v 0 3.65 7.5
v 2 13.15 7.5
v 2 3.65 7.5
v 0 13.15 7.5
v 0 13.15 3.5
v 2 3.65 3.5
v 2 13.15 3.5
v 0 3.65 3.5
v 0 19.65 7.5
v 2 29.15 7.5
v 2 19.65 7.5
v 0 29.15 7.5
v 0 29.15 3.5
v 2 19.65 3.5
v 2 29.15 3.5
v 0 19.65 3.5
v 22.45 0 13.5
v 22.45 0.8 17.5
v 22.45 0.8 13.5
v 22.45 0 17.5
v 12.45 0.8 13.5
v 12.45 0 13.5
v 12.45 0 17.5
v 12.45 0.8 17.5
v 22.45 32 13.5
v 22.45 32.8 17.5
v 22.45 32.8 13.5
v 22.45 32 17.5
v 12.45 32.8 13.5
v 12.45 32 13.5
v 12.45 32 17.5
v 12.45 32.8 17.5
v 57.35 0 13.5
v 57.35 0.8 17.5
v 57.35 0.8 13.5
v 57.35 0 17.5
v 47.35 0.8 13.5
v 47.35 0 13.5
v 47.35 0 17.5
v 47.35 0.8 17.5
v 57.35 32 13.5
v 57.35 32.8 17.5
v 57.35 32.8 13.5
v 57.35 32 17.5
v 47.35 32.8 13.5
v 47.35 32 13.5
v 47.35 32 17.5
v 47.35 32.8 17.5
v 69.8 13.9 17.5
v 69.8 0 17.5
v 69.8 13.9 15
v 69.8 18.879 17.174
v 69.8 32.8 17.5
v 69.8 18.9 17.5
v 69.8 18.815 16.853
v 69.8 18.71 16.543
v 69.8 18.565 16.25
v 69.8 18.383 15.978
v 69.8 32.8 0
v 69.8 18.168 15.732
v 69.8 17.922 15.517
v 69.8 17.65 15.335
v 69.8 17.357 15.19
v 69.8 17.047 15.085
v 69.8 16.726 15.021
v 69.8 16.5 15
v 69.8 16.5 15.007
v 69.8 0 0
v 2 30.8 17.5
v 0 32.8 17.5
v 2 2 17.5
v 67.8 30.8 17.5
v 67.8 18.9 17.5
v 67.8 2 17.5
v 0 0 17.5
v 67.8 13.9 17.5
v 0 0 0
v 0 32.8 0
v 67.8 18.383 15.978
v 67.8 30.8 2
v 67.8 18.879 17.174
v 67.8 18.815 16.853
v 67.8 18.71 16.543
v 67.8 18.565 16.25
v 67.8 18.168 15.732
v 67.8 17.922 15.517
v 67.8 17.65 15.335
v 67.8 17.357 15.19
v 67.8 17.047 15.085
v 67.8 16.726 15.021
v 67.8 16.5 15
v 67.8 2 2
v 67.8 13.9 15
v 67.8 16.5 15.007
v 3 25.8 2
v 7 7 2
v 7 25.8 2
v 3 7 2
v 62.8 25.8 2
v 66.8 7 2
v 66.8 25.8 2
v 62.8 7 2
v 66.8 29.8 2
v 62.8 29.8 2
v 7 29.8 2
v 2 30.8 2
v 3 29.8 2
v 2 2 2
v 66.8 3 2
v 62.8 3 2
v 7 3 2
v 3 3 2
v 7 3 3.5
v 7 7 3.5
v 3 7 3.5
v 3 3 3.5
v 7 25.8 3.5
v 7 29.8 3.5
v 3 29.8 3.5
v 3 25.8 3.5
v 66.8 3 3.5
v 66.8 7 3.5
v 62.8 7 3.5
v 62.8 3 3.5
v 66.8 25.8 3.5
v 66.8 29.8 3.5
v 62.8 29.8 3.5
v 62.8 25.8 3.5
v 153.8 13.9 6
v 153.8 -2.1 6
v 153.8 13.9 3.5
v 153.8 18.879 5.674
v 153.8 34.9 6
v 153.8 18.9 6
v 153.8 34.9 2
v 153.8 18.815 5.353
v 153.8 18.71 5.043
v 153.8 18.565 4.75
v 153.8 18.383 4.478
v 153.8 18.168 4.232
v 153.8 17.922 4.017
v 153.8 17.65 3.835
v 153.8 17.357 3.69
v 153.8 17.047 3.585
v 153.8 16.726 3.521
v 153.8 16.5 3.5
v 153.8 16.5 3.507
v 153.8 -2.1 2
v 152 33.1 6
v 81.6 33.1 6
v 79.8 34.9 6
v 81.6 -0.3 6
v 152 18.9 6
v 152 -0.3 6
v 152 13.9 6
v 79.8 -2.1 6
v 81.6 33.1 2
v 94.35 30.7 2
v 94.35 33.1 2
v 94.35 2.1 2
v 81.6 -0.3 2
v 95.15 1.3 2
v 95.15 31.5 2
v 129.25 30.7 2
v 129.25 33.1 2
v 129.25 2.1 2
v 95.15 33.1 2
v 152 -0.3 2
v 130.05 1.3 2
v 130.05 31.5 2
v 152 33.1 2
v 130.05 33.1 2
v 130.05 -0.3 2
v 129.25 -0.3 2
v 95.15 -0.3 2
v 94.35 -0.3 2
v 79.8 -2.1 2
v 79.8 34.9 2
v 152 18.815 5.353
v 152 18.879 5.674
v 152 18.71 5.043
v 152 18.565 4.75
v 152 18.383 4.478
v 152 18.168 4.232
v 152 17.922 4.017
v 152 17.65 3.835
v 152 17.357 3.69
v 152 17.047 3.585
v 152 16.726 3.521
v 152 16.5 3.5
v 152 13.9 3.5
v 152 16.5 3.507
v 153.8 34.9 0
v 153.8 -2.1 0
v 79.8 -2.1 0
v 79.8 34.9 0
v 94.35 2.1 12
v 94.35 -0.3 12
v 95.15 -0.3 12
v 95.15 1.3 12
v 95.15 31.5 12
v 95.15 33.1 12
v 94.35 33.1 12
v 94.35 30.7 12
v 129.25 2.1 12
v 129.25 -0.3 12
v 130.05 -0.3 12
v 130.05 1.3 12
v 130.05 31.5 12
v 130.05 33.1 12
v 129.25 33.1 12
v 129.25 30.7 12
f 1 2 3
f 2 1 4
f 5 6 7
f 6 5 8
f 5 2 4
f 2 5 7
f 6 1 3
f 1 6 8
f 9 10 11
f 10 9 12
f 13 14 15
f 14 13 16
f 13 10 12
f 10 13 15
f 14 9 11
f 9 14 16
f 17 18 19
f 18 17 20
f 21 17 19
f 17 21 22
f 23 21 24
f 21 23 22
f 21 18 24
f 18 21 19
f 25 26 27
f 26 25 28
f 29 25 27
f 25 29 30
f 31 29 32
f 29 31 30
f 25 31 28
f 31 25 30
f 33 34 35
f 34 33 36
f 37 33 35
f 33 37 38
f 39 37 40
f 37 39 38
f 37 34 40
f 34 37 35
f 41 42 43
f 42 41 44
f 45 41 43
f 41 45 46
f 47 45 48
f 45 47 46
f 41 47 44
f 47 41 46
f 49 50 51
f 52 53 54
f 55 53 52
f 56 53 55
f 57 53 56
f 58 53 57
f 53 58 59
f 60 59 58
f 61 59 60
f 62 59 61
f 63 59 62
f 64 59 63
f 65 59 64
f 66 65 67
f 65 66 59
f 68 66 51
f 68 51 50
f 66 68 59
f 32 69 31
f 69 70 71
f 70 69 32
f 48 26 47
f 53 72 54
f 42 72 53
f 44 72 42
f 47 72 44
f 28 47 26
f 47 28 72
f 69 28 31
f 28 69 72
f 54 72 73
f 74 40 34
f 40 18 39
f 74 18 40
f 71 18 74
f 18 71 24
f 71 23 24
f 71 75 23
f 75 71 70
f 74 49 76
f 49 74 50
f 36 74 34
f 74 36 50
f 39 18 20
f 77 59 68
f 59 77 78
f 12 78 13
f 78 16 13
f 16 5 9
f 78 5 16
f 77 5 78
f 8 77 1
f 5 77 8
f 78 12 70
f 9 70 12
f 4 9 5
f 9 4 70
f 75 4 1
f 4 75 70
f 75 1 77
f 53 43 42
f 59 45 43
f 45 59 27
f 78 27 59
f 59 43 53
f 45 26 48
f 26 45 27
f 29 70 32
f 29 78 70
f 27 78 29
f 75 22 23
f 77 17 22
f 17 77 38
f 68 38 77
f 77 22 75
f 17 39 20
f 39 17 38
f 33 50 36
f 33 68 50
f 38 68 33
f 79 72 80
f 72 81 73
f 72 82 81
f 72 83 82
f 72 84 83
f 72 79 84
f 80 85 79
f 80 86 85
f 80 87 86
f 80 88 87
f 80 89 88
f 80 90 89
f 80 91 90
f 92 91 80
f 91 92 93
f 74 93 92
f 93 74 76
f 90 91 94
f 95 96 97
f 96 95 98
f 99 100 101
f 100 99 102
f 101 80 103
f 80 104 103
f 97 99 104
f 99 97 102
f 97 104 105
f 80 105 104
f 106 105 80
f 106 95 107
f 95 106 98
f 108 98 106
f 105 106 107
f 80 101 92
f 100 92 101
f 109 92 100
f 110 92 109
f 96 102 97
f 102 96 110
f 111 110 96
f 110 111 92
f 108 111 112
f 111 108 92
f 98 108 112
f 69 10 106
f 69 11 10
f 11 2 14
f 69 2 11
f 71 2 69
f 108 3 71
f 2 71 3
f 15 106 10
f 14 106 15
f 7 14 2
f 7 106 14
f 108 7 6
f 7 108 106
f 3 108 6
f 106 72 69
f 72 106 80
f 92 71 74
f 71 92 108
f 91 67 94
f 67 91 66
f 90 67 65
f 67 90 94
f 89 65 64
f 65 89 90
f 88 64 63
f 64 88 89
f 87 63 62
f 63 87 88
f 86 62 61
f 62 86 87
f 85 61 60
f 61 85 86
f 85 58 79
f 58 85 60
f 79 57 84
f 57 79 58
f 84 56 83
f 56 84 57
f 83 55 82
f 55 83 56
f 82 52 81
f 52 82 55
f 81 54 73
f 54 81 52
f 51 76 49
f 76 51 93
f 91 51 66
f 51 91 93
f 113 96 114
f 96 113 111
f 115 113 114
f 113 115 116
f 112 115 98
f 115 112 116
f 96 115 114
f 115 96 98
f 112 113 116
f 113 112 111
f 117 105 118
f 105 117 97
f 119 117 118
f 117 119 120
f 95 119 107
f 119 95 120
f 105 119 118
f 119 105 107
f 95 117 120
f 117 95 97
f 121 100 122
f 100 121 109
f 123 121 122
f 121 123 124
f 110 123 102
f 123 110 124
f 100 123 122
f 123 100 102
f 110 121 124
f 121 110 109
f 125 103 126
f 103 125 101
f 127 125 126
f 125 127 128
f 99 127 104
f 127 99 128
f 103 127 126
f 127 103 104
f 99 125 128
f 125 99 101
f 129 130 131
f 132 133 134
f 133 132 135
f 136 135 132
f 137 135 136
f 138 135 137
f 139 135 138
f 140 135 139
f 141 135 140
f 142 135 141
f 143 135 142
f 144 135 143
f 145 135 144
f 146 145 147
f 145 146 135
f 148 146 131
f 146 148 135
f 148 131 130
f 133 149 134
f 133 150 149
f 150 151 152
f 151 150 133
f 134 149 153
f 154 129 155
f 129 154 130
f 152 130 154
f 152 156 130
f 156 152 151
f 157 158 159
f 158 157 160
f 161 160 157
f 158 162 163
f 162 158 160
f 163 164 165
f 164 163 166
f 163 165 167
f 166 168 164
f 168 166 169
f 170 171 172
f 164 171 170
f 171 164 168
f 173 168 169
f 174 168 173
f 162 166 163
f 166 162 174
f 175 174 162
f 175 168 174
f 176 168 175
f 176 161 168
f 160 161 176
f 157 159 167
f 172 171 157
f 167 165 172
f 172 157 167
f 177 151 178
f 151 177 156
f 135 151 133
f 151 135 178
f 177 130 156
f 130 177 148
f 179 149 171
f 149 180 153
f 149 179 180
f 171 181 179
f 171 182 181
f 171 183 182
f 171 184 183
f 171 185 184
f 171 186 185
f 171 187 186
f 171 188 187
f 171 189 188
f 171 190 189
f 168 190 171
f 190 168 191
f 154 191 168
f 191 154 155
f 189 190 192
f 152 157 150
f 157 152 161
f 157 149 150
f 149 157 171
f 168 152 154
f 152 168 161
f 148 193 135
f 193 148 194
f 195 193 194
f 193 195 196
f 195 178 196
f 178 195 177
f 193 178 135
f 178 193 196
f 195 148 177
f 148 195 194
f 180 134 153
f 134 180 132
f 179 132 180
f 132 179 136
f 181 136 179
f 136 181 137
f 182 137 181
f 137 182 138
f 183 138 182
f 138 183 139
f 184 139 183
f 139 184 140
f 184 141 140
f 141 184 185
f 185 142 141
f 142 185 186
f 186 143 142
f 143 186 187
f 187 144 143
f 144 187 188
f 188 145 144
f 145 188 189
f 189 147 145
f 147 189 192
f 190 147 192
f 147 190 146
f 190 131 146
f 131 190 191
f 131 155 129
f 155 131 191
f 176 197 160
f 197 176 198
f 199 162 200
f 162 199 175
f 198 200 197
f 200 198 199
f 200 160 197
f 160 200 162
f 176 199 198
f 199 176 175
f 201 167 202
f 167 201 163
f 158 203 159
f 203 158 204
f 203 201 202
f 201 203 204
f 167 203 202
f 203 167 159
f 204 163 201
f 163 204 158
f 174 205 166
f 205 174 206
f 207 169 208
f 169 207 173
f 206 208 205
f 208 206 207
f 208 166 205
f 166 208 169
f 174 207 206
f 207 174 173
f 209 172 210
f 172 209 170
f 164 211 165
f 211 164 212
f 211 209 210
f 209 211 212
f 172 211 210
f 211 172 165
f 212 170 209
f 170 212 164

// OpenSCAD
// ─────────────────────────────────────────────────────────────────────────────
// CWPokeKey — Caja para ESP32-S3 DevKitC-1
// OpenSCAD paramétrico · tapa a presión (4 clips en los lados largos)
//
// EJES
//   X : eje largo de la placa  (X=0 → pared USB-C  /  X=OL → pared jack TRS)
//   Y : eje ancho (headers)
//   Z : altura
//
// CÓMO USAR
//   F5 = vista previa   F6 = render final   Archivo › Exportar › Export as STL
//
//   Cuerpo : deja  render_box();  y comenta  render_lid();
//   Tapa   : deja  render_lid();  y comenta  render_box();
//
// ORIENTACIÓN DE IMPRESIÓN
//   Cuerpo : suelo hacia abajo — sin soportes
//   Tapa   : cara exterior hacia abajo (girar 180° en el slicer) — sin soportes
//
// AJUSTE
//   TOL     : aumenta si la placa entra muy justa
//   LIP_GAP : aumenta si la tapa no desliza
//   SNAP_D  : reduce si los clips van muy duros
// ─────────────────────────────────────────────────────────────────────────────

$fn = 48;

// ── PLACA ────────────────────────────────────────────────────────────────────

BL = 65;   // largo con headers  (eje X: pared USB-C ↔ pared jack)
BW = 28;   // ancho con headers  (eje Y)
BH = 14;   // alto total (PCB + componentes + pines)

// ── GEOMETRÍA DE CAJA ────────────────────────────────────────────────────────

TOL   = 0.4;  // holgura por lado
WL    = 2.0;  // grosor de pared
FLOOR = 1.5;  // espacio libre bajo la placa

// Dimensiones interiores
IL = BL + 2*TOL;
IW = BW + 2*TOL;
IH = BH + FLOOR;

// Dimensiones exteriores del cuerpo
OL = IL + 2*WL;
OW = IW + 2*WL;
OH = IH + WL;   // WL = suelo sólido

// ── APERTURAS USB-C (pared X=0, extremo corto) ───────────────────────────────
// Dos conectores USB-C centrados en el ancho de la placa

USB_W  = 9.5;   // ancho de cada apertura
USB_H  = 4.0;   // alto de cada apertura
USB_CC = 16.0;  // distancia centro a centro entre los dos conectores
USB_Z  =  2.0;  // altura del centro del conector sobre el fondo de la placa

// ── RANURA JACK TRS (pared X=OL, forma U abierta arriba) ─────────────────────

JACK_R = 2.5;   // radio ranura: cable 4 mm + 0.5 mm holgura

// ── CLIPS DE CIERRE ──────────────────────────────────────────────────────────
// 2 clips en la pared Y=0, 2 en la pared Y=OW (lados largos)

CLIP_W  = 10;   // ancho del clip
LIP_D   =  4;   // profundidad del labio de la tapa
LIP_GAP = 0.3;  // holgura labio ↔ exterior de caja
SNAP_D  = 0.8;  // profundidad del resalte de enganche

// ── TAPA ─────────────────────────────────────────────────────────────────────

LID_T   = 2.0;  // grosor panel de tapa
LIP_WL  = 1.8;  // grosor del labio de la tapa

// ── CALCULADOS ────────────────────────────────────────────────────────────────

// Centro absoluto (Z) del conector USB desde el exterior del suelo
usb_z_abs = WL + FLOOR + USB_Z;

// X de los dos clips por cara larga (en OL*0.25 y OL*0.75)
clip_x = [OL*0.25, OL*0.75];

// ─────────────────────────────────────────────────────────────────────────────
// MÓDULOS
// ─────────────────────────────────────────────────────────────────────────────

// Ranura en U: semicírculo en la base + slot rectangular hasta el borde superior
// Se usa para el hueco del jack en el cuerpo y en la tapa.
// Orientación: la apertura queda en +Z (hacia arriba).
// La geometría se extrude en el eje Y (rotation -90° para cortar pared en X).
module u_slot_xz(r, thick) {
    // Llamada: translate al centro, rotate para orientar, luego extruye en Y
    linear_extrude(thick + 0.2)
        union() {
            circle(r = r);
            translate([-r, -r]) square([r*2, r + 0.1]);
        }
}

// ─────────────────────────────────────────────────────────────────────────────
// CUERPO
// ─────────────────────────────────────────────────────────────────────────────

module box_body() {
    difference() {
        // Bloque exterior sólido
        cube([OL, OW, OH]);

        // Vaciado interior (abierto por arriba, +1 para limpiar cara superior)
        translate([WL, WL, WL])
            cube([IL, IW, IH + 1]);

        // ── Aperturas USB-C (pared X=0) ──────────────────────────────────
        for (yc = [OW/2 - USB_CC/2, OW/2 + USB_CC/2])
            translate([-0.1, yc - USB_W/2, usb_z_abs - USB_H/2])
                cube([WL + 0.2, USB_W, USB_H]);

        // ── Ranura U jack TRS (pared X=OL) ───────────────────────────────
        // El semicírculo queda centrado en Y=OW/2, Z=OH (borde superior)
        translate([OL - WL - 0.1, OW/2, OH])
            rotate([0, 90, 0])                // extruye en +X (atraviesa la pared)
                u_slot_xz(JACK_R, WL);

        // ── Muescas para clips (pared Y=0 y Y=OW) ────────────────────────
        for (cx = clip_x) {
            // Pared Y=0
            translate([cx - CLIP_W/2, -0.1, OH - LIP_D])
                cube([CLIP_W, SNAP_D + 0.1, LIP_D + 0.1]);
            // Pared Y=OW
            translate([cx - CLIP_W/2, OW - SNAP_D, OH - LIP_D])
                cube([CLIP_W, SNAP_D + 0.1, LIP_D + 0.1]);
        }
    }

    // Topes de esquina: elevan la placa FLOOR mm del suelo
    for (x = [WL + 1, OL - WL - 5])
        for (y = [WL + 1, OW - WL - 5])
            translate([x, y, WL])
                cube([4, 4, FLOOR]);
}

// ─────────────────────────────────────────────────────────────────────────────
// TAPA
// ─────────────────────────────────────────────────────────────────────────────

// El labio envuelve el exterior del cuerpo con holgura LIP_GAP.
// Modelada "al derecho" (cara exterior arriba); para imprimirla,
// girar 180° en el slicer para que la cara exterior quede sobre la cama.

module lid() {
    // Dimensiones exteriores del labio
    ll = OL + 2*(LIP_GAP + LIP_WL);
    lw = OW + 2*(LIP_GAP + LIP_WL);
    // Offset del labio respecto al origen del cuerpo
    lx = -(LIP_GAP + LIP_WL);
    ly = -(LIP_GAP + LIP_WL);

    difference() {
        union() {
            // Panel superior de la tapa
            translate([lx, ly, 0])
                cube([ll, lw, LID_T]);

            // Labio perimetral (baja LIP_D desde el panel)
            translate([lx, ly, LID_T])
                difference() {
                    cube([ll, lw, LIP_D]);
                    // Vaciado interior (deja solo la pared LIP_WL)
                    translate([LIP_WL, LIP_WL, -0.1])
                        cube([ll - 2*LIP_WL, lw - 2*LIP_WL, LIP_D + 0.2]);
                }
        }

        // ── Ranura U en el labio (lado jack, X=OL) ───────────────────────
        // La ranura debe alinearse con la del cuerpo:
        // centro en Y=OW/2, parte inferior en Z=LID_T+(LIP_D-JACK_R) para
        // que el semicírculo quede a la misma cota que en el cuerpo.
        translate([OL + LIP_GAP + LIP_WL + 0.1, OW/2, LID_T + LIP_D])
            rotate([0, -90, 0])                // extruye en -X
                u_slot_xz(JACK_R, LIP_WL + LIP_GAP);
    }

    // ── Resaltes de enganche en el interior del labio (lados largos Y) ───
    for (cx = clip_x) {
        // Lado Y=0: resalte en cara interior Y+ del labio
        translate([cx - CLIP_W/2, lx + LIP_WL, LID_T])
            snap_bump();
        // Lado Y=OW: resalte en cara interior Y- del labio
        translate([cx - CLIP_W/2, OW + LIP_GAP, LID_T])
            mirror([0, 1, 0])
                snap_bump();
    }
}

// Resalte triangular — engancha en la muesca del cuerpo
module snap_bump() {
    linear_extrude(CLIP_W)
        polygon([
            [0, 0],
            [0, LIP_D * 0.6],
            [SNAP_D, LIP_D * 0.4],
            [SNAP_D, 0]
        ]);
}

// ─────────────────────────────────────────────────────────────────────────────
// RENDER
// ─────────────────────────────────────────────────────────────────────────────

module render_box() {
    box_body();
}

module render_lid() {
    // Para preview conjunto: tapa flotando 8 mm sobre el cuerpo
    translate([0, 0, OH + 8])
        lid();
}

// ┌──────────────────────────────────────────────────────┐
// │  DESCOMENTA LO QUE QUIERAS EXPORTAR (uno cada vez)  │
// └──────────────────────────────────────────────────────┘

// ── Posición de impresión: cuerpo y tapa uno al lado del otro ────────────────
// Cuerpo: suelo hacia abajo, apertura arriba — sin soportes
render_box();

// Tapa: panel exterior hacia abajo (Z=0), labio hacia arriba — sin soportes
// Se desplaza OL+10 mm en X para dejar 10 mm de espacio entre piezas
translate([OL + 10 + (LIP_GAP + LIP_WL), 0, 0])
    lid();

// Vista de conjunto montado (tapa flotando sobre el cuerpo):
// render_box(); render_lid();
